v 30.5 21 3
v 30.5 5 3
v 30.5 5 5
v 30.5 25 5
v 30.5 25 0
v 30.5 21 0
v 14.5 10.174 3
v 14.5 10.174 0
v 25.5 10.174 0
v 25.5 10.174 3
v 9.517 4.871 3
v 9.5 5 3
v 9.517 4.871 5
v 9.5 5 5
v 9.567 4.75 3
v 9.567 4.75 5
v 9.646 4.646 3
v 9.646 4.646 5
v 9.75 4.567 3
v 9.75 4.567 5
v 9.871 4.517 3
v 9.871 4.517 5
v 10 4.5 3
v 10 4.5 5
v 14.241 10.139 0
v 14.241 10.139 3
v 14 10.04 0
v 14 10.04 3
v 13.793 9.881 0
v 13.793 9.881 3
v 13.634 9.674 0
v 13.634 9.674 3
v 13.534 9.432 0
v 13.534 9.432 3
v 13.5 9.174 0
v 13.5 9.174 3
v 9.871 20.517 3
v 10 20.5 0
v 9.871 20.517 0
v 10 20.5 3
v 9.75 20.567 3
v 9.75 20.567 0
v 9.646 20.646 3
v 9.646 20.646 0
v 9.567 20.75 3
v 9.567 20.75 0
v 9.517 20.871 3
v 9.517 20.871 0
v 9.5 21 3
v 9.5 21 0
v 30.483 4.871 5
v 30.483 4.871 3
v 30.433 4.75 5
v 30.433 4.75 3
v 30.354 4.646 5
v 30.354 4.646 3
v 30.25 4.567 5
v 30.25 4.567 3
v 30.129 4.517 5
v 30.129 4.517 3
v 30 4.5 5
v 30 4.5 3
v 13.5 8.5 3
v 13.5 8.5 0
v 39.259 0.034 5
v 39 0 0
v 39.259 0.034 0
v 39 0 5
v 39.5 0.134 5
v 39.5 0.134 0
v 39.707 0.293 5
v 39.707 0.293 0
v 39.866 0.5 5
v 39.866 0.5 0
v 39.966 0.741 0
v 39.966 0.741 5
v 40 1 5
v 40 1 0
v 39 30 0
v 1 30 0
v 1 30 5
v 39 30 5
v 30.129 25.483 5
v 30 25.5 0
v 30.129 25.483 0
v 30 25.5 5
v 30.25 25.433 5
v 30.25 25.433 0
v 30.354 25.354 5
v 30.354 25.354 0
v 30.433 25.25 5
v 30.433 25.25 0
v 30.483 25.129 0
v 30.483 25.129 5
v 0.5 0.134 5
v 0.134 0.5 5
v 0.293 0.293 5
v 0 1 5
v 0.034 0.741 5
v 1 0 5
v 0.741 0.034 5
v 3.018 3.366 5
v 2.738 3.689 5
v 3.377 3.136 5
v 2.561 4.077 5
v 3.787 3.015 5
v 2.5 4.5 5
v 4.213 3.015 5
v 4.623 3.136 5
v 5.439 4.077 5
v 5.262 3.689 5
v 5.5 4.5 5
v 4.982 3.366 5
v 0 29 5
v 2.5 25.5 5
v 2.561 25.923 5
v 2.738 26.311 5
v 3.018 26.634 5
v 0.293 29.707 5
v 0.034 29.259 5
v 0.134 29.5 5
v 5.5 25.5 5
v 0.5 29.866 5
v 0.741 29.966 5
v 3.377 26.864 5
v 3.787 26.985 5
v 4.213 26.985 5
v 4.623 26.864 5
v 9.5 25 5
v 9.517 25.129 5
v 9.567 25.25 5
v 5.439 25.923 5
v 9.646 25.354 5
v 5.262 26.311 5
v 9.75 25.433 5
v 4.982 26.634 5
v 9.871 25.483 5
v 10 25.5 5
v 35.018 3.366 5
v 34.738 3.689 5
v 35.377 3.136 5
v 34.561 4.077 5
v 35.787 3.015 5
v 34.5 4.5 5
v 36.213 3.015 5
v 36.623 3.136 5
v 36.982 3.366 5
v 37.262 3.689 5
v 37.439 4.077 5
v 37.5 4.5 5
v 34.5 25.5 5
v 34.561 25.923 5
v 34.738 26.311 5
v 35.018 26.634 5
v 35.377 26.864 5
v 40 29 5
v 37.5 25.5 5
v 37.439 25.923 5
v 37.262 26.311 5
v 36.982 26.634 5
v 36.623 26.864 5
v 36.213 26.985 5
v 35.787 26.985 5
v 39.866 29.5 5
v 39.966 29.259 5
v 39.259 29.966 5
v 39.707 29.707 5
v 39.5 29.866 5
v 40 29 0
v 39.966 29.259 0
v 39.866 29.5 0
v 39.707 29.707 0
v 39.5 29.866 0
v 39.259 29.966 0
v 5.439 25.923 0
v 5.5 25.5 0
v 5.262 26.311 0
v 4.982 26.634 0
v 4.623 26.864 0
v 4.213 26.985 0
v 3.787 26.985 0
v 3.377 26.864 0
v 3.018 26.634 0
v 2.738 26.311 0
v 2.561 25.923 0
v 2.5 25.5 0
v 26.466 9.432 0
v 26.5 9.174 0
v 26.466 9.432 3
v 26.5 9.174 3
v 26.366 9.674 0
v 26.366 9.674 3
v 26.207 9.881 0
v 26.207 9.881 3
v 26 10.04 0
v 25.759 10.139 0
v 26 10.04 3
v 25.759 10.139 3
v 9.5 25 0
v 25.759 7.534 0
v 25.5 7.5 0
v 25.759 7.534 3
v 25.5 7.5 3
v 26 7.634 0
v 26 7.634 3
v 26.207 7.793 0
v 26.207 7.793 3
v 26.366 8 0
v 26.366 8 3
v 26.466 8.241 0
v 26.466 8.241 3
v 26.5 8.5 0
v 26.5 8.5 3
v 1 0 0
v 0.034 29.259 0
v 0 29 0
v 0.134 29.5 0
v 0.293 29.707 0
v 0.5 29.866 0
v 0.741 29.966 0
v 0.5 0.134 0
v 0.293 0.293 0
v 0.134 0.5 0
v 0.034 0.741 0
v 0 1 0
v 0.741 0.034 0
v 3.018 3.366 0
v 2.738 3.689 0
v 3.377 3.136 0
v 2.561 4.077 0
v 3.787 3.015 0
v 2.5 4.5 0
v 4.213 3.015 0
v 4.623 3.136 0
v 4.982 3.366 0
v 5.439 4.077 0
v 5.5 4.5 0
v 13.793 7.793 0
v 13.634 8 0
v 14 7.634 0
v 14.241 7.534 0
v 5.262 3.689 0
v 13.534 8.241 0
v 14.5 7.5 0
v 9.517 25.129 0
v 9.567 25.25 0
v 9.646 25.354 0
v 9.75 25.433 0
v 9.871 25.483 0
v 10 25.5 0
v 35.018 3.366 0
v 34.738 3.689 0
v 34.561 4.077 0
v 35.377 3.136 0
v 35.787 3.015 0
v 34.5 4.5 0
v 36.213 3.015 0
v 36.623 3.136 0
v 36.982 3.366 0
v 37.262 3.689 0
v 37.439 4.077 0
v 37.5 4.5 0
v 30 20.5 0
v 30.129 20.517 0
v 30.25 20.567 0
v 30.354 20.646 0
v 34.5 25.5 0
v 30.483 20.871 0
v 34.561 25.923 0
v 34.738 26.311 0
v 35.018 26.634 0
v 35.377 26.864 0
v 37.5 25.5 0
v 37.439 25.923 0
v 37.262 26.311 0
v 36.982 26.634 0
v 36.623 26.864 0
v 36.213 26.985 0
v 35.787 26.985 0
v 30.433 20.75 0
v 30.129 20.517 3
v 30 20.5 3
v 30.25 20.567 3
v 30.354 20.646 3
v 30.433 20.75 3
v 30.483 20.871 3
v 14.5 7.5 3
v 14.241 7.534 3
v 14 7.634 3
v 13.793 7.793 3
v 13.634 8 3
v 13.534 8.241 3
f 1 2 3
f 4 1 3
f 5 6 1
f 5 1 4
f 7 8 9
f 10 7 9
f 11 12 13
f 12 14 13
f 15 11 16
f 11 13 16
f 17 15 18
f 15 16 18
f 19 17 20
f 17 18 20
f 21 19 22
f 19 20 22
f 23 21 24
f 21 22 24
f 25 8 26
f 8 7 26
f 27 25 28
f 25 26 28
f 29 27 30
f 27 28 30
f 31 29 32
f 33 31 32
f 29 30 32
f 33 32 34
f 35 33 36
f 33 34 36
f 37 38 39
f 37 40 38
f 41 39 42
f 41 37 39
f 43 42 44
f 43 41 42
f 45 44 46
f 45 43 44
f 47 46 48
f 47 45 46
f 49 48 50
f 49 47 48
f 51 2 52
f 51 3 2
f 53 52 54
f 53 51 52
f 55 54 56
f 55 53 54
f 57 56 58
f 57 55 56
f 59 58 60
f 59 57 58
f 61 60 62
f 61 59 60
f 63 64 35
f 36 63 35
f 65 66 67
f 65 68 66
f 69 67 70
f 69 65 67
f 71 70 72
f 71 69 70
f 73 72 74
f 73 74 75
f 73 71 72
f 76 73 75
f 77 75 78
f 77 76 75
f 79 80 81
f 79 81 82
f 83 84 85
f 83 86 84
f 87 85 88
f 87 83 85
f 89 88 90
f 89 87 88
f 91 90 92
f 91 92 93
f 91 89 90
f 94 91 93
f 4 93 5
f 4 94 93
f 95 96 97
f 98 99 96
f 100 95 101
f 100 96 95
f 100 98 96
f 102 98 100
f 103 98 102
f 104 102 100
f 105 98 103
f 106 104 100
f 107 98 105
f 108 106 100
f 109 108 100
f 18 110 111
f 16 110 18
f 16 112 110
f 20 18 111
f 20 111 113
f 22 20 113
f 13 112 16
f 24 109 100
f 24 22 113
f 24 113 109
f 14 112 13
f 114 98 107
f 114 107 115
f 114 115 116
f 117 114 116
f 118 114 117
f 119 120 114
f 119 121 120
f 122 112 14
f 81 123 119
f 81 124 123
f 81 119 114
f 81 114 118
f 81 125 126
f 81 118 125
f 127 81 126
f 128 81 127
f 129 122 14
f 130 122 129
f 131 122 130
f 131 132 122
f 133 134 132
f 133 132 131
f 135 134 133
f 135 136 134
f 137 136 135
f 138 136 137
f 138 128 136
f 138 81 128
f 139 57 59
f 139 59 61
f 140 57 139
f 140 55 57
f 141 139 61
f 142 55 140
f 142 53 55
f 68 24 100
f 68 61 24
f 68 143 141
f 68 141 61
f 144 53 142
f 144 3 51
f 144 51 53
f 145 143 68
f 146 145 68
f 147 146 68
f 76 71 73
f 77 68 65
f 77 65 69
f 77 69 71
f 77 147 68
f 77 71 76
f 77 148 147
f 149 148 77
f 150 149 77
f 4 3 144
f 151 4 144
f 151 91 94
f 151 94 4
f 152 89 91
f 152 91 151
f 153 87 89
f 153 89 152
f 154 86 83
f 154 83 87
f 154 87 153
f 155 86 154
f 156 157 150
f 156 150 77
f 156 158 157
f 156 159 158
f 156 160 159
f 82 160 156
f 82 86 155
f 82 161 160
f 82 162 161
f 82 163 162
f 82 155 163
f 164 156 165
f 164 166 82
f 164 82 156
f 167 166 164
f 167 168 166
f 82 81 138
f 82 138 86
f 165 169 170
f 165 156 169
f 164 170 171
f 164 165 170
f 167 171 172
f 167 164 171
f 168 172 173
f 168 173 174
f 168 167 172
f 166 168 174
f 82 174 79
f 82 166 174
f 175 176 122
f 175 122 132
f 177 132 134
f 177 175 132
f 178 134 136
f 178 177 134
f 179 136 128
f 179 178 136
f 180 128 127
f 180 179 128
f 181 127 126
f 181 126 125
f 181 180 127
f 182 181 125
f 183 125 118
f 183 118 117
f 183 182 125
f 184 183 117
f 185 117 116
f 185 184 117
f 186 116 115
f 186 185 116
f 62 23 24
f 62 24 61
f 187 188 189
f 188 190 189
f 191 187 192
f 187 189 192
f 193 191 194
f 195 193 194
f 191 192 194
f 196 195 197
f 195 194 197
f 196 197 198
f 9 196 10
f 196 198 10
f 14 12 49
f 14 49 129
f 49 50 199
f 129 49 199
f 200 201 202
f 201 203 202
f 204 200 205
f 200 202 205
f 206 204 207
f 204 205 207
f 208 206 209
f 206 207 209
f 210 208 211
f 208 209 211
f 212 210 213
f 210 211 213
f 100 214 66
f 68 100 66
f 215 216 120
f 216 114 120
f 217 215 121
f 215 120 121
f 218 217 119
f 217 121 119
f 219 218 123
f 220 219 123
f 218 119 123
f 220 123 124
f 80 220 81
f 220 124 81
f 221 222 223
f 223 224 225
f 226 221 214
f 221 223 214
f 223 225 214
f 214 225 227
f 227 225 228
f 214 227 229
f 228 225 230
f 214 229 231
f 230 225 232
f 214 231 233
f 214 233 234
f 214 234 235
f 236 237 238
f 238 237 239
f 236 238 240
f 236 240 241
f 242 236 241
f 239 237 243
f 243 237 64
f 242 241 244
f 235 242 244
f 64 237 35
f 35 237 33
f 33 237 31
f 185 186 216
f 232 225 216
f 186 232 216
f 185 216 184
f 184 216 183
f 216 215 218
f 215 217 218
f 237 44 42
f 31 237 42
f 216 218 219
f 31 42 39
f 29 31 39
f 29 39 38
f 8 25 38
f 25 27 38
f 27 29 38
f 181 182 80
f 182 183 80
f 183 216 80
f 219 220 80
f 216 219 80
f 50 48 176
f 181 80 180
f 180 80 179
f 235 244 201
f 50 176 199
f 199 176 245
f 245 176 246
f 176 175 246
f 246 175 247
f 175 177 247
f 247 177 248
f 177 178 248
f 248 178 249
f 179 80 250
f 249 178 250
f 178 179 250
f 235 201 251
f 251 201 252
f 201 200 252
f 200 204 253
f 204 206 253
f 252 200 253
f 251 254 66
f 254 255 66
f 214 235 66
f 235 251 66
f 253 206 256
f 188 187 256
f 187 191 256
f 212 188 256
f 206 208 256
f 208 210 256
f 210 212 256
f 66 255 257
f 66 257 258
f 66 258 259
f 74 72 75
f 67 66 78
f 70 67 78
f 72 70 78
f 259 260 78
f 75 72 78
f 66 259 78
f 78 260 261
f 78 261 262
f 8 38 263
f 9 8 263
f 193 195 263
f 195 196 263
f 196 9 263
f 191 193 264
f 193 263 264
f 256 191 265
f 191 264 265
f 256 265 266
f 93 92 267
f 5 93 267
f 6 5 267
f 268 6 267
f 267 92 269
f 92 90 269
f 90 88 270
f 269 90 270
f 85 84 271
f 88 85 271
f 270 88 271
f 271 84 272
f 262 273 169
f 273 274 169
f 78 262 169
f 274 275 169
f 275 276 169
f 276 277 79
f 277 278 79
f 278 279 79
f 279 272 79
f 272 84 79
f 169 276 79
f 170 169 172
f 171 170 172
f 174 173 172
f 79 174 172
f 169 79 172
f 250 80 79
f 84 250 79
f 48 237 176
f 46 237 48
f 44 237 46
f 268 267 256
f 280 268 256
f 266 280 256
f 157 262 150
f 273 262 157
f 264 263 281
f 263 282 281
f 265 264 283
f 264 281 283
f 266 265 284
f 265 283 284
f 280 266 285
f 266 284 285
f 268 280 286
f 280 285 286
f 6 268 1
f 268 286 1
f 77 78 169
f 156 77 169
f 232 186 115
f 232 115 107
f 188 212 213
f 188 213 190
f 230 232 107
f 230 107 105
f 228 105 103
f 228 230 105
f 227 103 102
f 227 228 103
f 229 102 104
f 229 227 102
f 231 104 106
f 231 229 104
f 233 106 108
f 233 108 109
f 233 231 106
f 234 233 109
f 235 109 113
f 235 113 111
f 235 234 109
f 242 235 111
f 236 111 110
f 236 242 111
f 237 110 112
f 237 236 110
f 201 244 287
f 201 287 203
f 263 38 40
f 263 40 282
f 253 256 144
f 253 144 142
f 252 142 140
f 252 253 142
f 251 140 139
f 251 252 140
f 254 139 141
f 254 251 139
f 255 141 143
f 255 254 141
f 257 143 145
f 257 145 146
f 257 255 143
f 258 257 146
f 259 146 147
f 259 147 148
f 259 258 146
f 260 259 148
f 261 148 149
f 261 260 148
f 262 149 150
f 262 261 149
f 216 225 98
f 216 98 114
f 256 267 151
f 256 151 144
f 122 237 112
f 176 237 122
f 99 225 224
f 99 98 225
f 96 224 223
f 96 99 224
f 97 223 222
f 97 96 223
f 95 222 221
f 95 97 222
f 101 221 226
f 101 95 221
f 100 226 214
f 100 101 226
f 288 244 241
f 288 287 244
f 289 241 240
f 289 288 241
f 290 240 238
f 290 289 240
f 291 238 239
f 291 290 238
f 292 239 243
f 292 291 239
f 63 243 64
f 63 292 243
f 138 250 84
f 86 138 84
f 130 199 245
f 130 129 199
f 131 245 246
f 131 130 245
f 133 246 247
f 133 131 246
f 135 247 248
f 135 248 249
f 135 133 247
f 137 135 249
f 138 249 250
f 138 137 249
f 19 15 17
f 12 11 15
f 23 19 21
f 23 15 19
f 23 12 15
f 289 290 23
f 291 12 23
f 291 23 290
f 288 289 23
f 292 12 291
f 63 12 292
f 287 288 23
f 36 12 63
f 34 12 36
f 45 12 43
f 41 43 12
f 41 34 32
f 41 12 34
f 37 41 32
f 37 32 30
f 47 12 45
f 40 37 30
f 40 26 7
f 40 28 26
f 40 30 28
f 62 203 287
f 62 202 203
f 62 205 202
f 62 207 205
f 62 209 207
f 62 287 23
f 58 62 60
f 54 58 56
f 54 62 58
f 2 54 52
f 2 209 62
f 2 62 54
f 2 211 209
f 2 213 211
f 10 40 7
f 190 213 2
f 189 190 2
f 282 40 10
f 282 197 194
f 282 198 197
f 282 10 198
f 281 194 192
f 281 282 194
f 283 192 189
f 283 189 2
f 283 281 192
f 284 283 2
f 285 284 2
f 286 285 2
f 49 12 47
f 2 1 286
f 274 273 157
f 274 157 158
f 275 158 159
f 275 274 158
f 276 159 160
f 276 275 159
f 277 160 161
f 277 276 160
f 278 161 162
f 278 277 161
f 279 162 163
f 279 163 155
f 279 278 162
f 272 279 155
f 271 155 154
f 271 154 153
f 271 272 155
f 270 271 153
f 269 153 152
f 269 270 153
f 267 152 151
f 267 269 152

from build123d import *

# Parameters (mm, degrees)
SCHIZZO2_W                   = 40
SCHIZZO2_H                   = 30
ESTRUSIONE_ESTRUSIONE1_DEPTH = 5
SCHIZZO2_3_W                 = 21
SCHIZZO2_3_H                 = 16
SCHIZZO2_3_W_2               = 13
SCHIZZO2_3_H_2               = 2.673538732
ESTRUSIONE_ESTRUSIONE2_DEPTH = 3
RACCORDO2_R                  = 1
RACCORDO3_R                  = 1
RACCORDO4_R                  = 0.5


with BuildPart() as part:
    # Schizzo2 → Estrusione-Estrusione1 (new body)
    with BuildSketch(Plane.XY):
        with Locations((20, 15)):
            Rectangle(SCHIZZO2_W, SCHIZZO2_H)
        with BuildLine():
            ThreePointArc((2.5, 25.5), (4, 27), (5.5, 25.5))
            Line((5.5, 25.5), (5.5, 4.5))
            ThreePointArc((5.5, 4.5), (4, 3), (2.5, 4.5))
            Line((2.5, 4.5), (2.5, 25.5))
        make_face(mode=Mode.SUBTRACT)
        Polygon((9.5, 20.5), (9.5, 25.5), (30.5, 25.5), (30.5, 20.5), (30.5, 4.5), (9.5, 4.5), align=None, mode=Mode.SUBTRACT)
        with BuildLine():
            ThreePointArc((34.5, 25.5), (36, 27), (37.5, 25.5))
            Line((37.5, 25.5), (37.5, 4.5))
            ThreePointArc((37.5, 4.5), (36, 3), (34.5, 4.5))
            Line((34.5, 4.5), (34.5, 25.5))
        make_face(mode=Mode.SUBTRACT)
    extrude(amount=ESTRUSIONE_ESTRUSIONE1_DEPTH)

    # Schizzo2<3> → Estrusione-Estrusione2 (add)
    with BuildSketch(Plane.XY):
        with Locations((20, 12.5)):
            Rectangle(SCHIZZO2_3_W, SCHIZZO2_3_H)
        with Locations((20, 8.836769366)):
            Rectangle(SCHIZZO2_3_W_2, SCHIZZO2_3_H_2, mode=Mode.SUBTRACT)
    extrude(amount=ESTRUSIONE_ESTRUSIONE2_DEPTH)

    # Raccordo2
    raccordo2_edges = [part.edges().sort_by_distance(p)[0] for p in [
        (13.5, 10.173538732, 1.5),
        (26.5, 10.173538732, 1.5),
        (26.5, 7.5, 1.5),
        (13.5, 7.5, 1.5),
    ]]
    fillet(raccordo2_edges, radius=RACCORDO2_R)

    # Raccordo3
    raccordo3_edges = [part.edges().sort_by_distance(p)[0] for p in [
        (0, 30, 2.5),
        (40, 30, 2.5),
        (40, 0, 2.5),
        (0, 0, 2.5),
    ]]
    fillet(raccordo3_edges, radius=RACCORDO3_R)

    # Raccordo4
    raccordo4_edges = [part.edges().sort_by_distance(p)[0] for p in [
        (30.5, 20.5, 1.5),
        (9.5, 20.5, 1.5),
        (30.5, 25.5, 2.5),
        (9.5, 25.5, 2.5),
        (30.5, 4.5, 4),
        (9.5, 4.5, 4),
    ]]
    fillet(raccordo4_edges, radius=RACCORDO4_R)


solid = part.part
